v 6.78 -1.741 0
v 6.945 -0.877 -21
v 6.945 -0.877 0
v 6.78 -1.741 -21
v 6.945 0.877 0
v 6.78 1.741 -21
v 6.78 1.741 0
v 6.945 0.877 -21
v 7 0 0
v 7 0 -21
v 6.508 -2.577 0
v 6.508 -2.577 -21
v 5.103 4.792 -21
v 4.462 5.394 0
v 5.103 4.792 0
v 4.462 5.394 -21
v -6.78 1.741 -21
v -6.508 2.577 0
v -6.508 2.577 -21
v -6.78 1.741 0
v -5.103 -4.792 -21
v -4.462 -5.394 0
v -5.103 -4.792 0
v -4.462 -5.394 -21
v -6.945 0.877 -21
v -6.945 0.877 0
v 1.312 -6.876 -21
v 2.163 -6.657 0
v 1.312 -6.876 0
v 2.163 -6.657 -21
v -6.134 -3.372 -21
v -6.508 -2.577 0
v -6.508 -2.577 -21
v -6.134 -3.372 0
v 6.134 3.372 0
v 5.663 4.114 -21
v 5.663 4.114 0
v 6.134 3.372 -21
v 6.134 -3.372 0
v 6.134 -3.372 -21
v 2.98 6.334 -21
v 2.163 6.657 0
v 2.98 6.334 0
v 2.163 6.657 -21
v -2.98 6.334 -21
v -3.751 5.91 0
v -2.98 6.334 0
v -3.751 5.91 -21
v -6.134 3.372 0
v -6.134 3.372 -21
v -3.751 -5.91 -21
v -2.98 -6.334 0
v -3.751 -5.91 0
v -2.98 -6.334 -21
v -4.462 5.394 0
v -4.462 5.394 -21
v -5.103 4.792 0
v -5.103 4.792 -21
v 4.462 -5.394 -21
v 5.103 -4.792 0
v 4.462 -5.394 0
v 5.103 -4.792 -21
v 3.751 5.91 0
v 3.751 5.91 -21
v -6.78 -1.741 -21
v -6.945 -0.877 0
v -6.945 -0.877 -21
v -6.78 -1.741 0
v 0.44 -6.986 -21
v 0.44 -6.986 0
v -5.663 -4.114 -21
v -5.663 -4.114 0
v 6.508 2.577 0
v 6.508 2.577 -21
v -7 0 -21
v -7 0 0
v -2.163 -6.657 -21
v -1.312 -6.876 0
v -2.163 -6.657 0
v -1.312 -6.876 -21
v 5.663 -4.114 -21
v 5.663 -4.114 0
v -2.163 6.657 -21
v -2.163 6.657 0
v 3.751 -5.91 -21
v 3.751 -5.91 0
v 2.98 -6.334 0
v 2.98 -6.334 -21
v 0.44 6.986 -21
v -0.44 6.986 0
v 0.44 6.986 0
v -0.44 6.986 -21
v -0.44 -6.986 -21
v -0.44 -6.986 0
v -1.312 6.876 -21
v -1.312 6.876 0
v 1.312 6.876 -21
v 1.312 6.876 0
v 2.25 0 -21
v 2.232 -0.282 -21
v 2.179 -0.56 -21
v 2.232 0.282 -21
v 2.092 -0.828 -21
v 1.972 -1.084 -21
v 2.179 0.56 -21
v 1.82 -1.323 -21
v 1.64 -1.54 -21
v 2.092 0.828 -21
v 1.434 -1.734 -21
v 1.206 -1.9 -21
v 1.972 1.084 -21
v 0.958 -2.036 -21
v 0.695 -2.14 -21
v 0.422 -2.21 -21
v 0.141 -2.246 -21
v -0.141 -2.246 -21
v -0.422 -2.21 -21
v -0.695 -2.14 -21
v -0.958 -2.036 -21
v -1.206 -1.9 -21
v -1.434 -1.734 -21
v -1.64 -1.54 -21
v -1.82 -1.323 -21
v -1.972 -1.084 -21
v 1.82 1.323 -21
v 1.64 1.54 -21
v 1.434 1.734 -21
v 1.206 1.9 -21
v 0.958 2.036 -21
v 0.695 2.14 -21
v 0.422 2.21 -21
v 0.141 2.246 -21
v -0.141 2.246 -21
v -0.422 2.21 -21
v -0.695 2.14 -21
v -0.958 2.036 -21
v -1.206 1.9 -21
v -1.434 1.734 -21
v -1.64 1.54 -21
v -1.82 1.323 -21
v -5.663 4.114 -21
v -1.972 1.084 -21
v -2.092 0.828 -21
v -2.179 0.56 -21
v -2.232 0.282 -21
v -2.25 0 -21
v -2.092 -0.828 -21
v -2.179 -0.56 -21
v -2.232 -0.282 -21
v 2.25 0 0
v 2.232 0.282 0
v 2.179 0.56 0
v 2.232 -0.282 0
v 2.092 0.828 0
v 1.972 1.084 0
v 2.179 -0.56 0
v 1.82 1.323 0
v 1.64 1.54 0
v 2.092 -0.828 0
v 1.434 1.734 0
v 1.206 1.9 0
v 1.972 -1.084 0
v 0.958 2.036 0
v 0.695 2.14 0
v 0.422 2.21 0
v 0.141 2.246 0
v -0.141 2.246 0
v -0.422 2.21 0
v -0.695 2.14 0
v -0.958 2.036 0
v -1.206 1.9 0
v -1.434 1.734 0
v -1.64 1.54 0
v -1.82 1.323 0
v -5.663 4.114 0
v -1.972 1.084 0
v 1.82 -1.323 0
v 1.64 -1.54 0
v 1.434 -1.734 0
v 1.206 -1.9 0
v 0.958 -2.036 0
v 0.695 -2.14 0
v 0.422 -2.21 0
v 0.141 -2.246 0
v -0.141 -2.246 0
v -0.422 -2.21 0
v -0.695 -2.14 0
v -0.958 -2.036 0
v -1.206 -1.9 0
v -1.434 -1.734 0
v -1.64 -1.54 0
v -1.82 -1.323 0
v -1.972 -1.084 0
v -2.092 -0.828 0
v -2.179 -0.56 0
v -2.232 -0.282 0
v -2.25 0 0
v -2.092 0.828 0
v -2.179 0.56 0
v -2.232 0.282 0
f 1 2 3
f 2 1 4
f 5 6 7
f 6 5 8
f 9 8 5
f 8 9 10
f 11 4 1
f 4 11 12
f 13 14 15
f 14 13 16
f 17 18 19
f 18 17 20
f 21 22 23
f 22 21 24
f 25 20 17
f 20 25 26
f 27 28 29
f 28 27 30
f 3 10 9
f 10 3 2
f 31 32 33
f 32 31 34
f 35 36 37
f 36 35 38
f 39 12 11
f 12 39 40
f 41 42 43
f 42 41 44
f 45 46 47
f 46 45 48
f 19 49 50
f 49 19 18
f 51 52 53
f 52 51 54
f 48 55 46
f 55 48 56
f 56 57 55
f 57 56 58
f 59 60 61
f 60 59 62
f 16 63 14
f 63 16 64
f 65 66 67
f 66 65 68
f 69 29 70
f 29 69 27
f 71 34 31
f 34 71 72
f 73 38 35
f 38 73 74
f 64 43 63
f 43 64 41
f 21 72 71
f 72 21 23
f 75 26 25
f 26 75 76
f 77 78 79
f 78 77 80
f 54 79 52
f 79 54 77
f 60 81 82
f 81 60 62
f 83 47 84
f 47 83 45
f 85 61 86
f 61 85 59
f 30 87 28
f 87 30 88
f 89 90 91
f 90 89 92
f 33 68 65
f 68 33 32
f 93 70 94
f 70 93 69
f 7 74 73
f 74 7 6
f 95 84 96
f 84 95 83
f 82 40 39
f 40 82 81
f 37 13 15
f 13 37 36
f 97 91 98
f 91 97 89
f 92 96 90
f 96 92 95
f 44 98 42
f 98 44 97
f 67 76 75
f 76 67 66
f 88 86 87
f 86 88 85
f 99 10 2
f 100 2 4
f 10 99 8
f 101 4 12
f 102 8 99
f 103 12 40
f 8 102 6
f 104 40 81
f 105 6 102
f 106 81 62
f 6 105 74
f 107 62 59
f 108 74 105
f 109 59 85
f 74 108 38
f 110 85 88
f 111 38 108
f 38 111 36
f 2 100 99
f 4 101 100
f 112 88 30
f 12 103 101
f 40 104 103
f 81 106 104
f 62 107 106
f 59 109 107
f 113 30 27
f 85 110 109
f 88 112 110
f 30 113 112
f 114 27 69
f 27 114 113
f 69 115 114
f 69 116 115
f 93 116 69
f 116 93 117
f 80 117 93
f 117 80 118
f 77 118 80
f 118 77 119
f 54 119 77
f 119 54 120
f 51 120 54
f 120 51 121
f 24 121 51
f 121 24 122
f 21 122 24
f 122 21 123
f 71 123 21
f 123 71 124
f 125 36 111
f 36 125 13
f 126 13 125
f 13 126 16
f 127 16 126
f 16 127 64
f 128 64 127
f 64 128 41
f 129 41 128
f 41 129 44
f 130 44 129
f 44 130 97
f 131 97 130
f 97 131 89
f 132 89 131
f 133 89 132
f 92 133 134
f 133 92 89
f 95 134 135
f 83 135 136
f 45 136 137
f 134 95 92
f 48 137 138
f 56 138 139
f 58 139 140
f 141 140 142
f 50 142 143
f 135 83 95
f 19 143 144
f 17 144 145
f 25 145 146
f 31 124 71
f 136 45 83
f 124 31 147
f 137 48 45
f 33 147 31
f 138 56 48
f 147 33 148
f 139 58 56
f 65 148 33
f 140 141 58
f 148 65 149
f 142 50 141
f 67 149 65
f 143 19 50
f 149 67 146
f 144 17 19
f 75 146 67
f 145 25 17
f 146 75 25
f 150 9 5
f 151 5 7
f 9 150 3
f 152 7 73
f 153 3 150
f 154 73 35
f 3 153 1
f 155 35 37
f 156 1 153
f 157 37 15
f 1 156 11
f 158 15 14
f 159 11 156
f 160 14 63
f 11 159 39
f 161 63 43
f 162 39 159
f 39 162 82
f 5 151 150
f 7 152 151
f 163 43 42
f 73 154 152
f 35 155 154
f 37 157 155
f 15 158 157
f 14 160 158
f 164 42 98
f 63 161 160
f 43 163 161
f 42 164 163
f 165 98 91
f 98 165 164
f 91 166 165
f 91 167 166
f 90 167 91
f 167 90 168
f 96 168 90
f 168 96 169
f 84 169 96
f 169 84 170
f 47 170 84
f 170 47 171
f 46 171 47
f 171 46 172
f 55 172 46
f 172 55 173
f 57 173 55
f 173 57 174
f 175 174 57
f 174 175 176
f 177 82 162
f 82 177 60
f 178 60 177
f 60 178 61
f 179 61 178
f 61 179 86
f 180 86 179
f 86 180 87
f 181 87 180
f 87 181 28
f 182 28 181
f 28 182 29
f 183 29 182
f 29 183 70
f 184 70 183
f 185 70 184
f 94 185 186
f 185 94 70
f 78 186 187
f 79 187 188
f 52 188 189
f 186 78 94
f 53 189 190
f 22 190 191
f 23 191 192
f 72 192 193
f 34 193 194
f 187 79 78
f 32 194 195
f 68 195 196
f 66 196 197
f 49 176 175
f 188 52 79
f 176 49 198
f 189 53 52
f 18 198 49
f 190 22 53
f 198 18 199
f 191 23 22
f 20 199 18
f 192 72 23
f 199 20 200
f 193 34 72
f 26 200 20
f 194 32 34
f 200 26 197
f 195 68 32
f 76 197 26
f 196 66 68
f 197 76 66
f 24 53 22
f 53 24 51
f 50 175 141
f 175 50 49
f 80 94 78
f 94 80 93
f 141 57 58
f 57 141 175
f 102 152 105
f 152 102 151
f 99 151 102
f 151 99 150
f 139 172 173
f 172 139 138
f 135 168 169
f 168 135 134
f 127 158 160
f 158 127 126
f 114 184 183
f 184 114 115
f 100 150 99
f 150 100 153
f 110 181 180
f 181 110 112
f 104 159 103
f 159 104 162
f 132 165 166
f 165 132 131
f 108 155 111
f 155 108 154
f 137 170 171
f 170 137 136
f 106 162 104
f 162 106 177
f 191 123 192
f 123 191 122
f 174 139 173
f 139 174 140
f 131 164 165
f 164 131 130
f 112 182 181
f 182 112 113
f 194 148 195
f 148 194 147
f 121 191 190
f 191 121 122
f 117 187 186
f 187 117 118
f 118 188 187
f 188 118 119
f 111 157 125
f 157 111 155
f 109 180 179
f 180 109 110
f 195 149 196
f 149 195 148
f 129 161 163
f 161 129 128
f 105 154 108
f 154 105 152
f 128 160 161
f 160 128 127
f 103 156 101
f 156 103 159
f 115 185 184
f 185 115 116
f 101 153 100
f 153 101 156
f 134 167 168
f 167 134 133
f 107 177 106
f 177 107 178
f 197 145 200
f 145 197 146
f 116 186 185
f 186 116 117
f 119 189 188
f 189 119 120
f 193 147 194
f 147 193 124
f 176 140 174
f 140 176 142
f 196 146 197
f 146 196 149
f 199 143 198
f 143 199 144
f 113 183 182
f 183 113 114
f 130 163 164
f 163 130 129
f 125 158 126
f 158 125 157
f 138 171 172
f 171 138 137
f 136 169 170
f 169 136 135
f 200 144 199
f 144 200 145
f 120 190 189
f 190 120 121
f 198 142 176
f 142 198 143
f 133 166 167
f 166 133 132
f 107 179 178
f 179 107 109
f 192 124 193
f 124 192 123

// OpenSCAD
$fn = 50;


difference() {
	union() {
		translate(v = [0, 0, -21.0000000000]) {
			cylinder(h = 21, r = 7.0000000000);
		}
		cylinder(h = 0, r = 17.0000000000);
	}
	union() {
		#translate(v = [0, 0, -21]) {
			cylinder(h = 21, r = 2.2500000000);
		}
	}
}
